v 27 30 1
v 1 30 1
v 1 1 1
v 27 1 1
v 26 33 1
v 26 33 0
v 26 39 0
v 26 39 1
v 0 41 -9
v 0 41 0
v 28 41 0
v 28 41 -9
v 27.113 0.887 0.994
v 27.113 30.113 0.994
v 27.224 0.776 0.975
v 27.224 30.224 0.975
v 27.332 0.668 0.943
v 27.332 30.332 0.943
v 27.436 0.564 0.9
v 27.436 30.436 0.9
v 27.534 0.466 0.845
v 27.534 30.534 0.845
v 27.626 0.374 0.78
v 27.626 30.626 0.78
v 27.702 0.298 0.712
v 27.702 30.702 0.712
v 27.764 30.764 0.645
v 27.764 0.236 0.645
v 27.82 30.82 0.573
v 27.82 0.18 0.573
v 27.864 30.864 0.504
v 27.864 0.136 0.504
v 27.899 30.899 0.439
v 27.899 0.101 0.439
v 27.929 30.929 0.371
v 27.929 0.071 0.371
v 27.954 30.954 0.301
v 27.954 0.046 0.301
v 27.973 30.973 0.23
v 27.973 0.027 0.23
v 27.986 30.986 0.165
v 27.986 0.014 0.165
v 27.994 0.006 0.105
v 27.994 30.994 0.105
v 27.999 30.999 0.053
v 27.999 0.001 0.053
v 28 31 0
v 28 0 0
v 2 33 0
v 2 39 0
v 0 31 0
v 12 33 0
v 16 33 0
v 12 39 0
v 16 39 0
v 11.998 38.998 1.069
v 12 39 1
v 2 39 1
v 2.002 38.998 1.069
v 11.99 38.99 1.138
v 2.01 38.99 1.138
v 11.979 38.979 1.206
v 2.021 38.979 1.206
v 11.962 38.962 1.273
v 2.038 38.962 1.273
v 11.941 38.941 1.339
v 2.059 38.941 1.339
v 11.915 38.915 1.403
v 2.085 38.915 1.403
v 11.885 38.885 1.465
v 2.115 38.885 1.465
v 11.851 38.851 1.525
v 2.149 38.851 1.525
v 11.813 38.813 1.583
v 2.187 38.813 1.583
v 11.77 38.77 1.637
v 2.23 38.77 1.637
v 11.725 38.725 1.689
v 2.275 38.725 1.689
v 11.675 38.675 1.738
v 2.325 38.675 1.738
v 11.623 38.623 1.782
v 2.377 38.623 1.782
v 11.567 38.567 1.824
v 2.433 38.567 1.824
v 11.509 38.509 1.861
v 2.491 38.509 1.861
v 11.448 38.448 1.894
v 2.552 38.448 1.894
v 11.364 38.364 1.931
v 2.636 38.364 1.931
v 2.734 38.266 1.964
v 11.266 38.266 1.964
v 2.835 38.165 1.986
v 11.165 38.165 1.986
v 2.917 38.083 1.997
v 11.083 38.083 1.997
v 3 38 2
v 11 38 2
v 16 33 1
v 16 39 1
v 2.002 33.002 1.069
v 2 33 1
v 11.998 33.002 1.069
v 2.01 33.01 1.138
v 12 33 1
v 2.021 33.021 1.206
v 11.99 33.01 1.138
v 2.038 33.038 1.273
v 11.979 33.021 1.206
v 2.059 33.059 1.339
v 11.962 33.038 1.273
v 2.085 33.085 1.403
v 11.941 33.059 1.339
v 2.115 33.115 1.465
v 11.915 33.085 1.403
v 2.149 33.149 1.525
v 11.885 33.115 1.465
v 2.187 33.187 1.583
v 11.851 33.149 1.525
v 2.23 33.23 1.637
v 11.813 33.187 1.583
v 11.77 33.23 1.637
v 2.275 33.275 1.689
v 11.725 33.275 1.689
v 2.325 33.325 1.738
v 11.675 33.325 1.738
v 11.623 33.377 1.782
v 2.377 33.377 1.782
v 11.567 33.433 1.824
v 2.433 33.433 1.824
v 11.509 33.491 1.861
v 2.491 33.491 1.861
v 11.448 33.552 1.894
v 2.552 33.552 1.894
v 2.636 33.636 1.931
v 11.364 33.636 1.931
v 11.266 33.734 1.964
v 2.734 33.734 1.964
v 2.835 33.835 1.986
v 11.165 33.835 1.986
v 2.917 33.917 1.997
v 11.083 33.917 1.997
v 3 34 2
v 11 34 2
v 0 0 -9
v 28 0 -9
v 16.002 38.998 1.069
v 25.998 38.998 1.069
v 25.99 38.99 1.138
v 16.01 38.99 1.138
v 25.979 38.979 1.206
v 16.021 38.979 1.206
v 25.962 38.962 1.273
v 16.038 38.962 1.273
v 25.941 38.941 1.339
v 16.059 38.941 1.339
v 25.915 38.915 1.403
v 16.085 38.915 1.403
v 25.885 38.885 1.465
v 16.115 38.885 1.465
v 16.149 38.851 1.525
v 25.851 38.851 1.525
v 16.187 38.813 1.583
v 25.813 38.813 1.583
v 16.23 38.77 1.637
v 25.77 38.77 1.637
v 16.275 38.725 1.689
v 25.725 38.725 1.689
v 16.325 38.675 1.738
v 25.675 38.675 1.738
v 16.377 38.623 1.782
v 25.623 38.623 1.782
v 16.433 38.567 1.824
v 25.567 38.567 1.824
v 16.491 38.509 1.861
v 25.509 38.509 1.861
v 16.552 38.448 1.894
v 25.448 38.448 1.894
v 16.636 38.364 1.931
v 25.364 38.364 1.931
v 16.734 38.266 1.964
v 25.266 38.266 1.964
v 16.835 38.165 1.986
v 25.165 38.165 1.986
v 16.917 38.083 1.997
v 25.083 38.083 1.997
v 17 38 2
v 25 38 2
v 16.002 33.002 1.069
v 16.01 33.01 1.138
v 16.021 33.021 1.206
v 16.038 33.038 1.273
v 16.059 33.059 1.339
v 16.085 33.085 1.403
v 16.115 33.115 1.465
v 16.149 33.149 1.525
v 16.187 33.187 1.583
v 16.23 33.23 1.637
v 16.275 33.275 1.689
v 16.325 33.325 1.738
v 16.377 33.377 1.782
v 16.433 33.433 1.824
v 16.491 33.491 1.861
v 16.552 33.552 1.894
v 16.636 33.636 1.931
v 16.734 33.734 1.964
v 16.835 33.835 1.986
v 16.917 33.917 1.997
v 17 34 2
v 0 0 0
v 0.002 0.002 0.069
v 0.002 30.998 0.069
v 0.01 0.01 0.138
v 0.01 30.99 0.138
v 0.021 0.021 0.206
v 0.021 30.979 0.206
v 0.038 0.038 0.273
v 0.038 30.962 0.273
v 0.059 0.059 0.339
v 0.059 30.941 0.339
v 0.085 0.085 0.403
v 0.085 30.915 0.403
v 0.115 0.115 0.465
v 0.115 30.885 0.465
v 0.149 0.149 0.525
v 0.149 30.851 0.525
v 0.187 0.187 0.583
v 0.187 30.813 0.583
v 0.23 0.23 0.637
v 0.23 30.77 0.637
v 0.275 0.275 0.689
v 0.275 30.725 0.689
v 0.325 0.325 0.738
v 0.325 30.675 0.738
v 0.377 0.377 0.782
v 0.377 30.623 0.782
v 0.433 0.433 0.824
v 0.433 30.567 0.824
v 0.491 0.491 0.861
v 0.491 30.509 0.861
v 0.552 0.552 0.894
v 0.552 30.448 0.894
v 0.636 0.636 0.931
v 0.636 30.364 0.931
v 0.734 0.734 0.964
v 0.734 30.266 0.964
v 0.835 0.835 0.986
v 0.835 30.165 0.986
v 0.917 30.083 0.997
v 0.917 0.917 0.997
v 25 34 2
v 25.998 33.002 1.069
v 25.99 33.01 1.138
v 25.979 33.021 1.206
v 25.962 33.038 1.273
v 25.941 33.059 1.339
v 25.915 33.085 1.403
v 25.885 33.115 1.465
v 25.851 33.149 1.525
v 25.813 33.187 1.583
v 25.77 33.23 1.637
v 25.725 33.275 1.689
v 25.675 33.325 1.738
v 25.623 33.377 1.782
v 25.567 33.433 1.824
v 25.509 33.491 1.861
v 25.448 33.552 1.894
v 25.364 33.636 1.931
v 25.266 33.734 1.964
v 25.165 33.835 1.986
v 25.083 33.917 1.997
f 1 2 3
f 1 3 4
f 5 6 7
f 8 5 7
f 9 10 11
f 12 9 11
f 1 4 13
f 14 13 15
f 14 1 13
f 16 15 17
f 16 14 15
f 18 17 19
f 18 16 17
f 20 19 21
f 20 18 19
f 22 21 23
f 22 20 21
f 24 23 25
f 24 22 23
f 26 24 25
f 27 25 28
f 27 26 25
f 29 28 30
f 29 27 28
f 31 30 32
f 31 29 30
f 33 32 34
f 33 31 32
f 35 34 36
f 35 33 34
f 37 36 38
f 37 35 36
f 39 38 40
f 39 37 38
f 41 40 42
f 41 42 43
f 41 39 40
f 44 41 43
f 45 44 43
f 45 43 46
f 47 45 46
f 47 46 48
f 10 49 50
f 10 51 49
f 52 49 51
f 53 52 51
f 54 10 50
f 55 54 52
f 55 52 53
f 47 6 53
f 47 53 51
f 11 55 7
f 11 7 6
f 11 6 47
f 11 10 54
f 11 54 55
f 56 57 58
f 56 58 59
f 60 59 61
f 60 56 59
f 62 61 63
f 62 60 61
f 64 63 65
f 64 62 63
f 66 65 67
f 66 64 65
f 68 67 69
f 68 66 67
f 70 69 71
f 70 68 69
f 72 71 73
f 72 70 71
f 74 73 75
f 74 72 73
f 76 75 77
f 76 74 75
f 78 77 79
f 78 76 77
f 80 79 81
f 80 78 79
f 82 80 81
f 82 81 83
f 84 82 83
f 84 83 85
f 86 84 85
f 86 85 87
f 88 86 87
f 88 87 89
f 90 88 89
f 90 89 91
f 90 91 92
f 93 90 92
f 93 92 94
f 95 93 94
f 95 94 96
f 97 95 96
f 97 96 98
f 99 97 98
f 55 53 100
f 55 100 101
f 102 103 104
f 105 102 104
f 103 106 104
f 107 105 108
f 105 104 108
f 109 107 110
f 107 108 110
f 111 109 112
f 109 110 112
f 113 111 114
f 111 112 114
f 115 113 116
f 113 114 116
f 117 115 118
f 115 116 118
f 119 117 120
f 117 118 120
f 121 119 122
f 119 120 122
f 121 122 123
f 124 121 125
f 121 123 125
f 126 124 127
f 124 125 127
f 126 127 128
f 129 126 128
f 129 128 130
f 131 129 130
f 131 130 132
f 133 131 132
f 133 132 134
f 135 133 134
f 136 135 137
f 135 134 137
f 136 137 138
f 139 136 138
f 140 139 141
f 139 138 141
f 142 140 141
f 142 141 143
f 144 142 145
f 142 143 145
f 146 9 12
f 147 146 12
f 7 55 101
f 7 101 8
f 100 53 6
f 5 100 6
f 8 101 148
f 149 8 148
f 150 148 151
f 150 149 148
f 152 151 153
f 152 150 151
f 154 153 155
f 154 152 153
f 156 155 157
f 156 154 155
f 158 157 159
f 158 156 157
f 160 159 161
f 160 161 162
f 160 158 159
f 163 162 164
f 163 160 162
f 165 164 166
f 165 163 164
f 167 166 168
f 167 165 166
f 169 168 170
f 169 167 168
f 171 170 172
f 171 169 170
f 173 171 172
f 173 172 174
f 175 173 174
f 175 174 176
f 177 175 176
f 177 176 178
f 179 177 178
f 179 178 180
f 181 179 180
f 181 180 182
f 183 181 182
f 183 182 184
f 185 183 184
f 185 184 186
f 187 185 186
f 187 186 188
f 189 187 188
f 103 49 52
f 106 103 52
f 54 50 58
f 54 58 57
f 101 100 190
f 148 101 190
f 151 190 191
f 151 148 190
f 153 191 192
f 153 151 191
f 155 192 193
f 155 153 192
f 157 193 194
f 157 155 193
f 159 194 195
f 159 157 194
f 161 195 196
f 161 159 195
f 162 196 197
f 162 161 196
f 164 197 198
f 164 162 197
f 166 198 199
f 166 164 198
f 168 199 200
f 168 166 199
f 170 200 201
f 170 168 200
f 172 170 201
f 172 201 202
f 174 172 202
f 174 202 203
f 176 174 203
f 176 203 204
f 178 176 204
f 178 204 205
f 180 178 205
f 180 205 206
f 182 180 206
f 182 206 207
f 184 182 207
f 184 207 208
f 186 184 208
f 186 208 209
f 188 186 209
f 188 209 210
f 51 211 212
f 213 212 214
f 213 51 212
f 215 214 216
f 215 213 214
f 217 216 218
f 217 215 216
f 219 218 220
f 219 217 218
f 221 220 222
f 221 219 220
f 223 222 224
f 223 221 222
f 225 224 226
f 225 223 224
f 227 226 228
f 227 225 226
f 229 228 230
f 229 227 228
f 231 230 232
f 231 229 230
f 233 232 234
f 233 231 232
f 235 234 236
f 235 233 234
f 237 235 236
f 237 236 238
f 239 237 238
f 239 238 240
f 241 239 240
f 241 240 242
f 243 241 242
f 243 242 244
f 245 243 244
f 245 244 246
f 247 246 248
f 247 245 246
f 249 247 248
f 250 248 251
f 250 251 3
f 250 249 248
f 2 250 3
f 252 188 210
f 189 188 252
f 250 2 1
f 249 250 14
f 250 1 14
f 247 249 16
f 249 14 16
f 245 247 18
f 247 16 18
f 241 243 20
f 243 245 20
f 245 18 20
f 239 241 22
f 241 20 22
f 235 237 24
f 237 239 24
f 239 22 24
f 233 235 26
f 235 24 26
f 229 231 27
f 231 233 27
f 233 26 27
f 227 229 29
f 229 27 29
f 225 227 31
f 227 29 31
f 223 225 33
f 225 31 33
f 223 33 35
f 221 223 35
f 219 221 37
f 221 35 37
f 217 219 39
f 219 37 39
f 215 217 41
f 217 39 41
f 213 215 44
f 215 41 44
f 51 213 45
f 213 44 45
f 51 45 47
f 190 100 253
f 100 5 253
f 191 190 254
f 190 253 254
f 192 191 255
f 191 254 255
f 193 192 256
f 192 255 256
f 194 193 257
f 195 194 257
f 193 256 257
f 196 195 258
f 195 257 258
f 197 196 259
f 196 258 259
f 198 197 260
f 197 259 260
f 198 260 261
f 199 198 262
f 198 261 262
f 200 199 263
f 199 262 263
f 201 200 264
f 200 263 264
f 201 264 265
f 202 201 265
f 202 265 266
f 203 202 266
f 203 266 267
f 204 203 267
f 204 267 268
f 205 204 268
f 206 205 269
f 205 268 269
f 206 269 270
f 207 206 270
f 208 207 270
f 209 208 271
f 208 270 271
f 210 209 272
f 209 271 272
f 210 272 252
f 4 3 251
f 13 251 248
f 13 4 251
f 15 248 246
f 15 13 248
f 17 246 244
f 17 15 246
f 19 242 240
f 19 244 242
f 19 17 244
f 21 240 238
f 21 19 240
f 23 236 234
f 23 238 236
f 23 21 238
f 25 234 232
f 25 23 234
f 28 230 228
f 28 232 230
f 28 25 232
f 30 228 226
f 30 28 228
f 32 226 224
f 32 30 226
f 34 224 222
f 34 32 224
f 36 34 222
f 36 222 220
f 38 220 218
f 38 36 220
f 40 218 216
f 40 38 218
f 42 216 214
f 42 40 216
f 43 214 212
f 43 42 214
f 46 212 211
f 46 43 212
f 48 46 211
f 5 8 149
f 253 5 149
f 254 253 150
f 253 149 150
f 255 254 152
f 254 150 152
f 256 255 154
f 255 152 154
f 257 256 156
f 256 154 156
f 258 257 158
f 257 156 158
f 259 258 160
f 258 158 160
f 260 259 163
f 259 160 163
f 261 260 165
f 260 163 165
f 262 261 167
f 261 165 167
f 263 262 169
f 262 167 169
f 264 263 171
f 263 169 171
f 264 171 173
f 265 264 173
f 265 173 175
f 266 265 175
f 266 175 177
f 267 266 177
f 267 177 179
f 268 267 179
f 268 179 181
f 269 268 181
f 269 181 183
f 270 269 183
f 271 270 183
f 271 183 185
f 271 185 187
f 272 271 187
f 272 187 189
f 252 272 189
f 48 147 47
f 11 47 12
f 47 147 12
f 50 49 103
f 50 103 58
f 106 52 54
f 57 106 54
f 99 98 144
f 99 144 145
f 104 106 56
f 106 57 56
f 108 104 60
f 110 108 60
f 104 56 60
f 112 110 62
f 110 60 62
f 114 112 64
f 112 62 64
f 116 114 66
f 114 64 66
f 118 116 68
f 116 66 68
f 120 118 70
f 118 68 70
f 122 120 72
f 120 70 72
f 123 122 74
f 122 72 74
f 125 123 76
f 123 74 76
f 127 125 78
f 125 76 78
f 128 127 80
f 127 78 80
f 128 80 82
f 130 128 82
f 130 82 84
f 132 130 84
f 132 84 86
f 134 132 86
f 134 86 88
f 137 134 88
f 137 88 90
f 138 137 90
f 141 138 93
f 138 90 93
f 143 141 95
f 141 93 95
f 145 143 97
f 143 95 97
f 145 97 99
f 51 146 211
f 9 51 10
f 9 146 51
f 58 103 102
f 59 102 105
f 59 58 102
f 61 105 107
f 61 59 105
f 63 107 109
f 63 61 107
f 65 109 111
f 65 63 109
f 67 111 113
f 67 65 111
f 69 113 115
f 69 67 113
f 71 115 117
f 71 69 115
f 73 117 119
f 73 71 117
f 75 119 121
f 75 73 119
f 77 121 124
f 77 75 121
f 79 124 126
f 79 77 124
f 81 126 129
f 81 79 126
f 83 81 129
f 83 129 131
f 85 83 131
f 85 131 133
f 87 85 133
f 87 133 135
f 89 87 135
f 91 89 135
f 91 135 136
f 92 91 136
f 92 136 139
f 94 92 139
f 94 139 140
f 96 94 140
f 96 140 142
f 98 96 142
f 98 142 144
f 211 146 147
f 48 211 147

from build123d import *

# Parameters (mm, degrees)
F0_W     = 28
F0_H     = 10
F0_W_2   = 10
F0_H_2   = 6
F0_H_3   = 31
F1_DEPTH = 9
F2_DEPTH = 1
F3_DEPTH = 2
F4_R     = 0.99999


# Not quite as in the source:
# - a fillet or chamfer is up to 0.001 mm smaller than in the source, because OpenCascade refuses the exact size


with BuildPart() as f1:
    # F0 (on Top) → F1 (new body)
    with BuildSketch(Plane.XY):
        with Locations((14, 36)):
            Rectangle(F0_W, F0_H)
        with Locations((7, 36)):
            Rectangle(F0_W_2, F0_H_2, mode=Mode.SUBTRACT)
        with Locations((21, 36)):
            Rectangle(F0_W_2, F0_H_2, mode=Mode.SUBTRACT)
        with Locations((7, 36)):
            Rectangle(F0_W_2, F0_H_2)
        with Locations((21, 36)):
            Rectangle(F0_W_2, F0_H_2)
        with Locations((14, 15.5)):
            Rectangle(F0_W, F0_H_3)
    extrude(amount=-F1_DEPTH)

    # F0 (on Top) → F2 (join)
    with BuildSketch(Plane.XY):
        with Locations((14, 15.5)):
            Rectangle(F0_W, F0_H_3)
    extrude(amount=F2_DEPTH)

    # F0 (on Top) → F3 (join)
    with BuildSketch(Plane.XY):
        with Locations((7, 36)):
            Rectangle(F0_W_2, F0_H_2)
        with Locations((21, 36)):
            Rectangle(F0_W_2, F0_H_2)
    extrude(amount=F3_DEPTH)

    # F4 (radius 1 in the source; OpenCascade refuses exactly that, so slightly less here)
    f4_edges = [f1.edges().sort_by_distance(p)[0] for p in [
        (12, 36, 2),
        (7, 39, 2),
        (2, 36, 2),
        (7, 33, 2),
        (21, 39, 2),
        (16, 36, 2),
        (21, 33, 2),
        (26, 36, 2),
        (0, 15.5, 1),
        (14, 0, 1),
        (28, 15.5, 1),
        (14, 31, 1),
    ]]
    fillet(f4_edges, radius=F4_R)


solid = f1.part
